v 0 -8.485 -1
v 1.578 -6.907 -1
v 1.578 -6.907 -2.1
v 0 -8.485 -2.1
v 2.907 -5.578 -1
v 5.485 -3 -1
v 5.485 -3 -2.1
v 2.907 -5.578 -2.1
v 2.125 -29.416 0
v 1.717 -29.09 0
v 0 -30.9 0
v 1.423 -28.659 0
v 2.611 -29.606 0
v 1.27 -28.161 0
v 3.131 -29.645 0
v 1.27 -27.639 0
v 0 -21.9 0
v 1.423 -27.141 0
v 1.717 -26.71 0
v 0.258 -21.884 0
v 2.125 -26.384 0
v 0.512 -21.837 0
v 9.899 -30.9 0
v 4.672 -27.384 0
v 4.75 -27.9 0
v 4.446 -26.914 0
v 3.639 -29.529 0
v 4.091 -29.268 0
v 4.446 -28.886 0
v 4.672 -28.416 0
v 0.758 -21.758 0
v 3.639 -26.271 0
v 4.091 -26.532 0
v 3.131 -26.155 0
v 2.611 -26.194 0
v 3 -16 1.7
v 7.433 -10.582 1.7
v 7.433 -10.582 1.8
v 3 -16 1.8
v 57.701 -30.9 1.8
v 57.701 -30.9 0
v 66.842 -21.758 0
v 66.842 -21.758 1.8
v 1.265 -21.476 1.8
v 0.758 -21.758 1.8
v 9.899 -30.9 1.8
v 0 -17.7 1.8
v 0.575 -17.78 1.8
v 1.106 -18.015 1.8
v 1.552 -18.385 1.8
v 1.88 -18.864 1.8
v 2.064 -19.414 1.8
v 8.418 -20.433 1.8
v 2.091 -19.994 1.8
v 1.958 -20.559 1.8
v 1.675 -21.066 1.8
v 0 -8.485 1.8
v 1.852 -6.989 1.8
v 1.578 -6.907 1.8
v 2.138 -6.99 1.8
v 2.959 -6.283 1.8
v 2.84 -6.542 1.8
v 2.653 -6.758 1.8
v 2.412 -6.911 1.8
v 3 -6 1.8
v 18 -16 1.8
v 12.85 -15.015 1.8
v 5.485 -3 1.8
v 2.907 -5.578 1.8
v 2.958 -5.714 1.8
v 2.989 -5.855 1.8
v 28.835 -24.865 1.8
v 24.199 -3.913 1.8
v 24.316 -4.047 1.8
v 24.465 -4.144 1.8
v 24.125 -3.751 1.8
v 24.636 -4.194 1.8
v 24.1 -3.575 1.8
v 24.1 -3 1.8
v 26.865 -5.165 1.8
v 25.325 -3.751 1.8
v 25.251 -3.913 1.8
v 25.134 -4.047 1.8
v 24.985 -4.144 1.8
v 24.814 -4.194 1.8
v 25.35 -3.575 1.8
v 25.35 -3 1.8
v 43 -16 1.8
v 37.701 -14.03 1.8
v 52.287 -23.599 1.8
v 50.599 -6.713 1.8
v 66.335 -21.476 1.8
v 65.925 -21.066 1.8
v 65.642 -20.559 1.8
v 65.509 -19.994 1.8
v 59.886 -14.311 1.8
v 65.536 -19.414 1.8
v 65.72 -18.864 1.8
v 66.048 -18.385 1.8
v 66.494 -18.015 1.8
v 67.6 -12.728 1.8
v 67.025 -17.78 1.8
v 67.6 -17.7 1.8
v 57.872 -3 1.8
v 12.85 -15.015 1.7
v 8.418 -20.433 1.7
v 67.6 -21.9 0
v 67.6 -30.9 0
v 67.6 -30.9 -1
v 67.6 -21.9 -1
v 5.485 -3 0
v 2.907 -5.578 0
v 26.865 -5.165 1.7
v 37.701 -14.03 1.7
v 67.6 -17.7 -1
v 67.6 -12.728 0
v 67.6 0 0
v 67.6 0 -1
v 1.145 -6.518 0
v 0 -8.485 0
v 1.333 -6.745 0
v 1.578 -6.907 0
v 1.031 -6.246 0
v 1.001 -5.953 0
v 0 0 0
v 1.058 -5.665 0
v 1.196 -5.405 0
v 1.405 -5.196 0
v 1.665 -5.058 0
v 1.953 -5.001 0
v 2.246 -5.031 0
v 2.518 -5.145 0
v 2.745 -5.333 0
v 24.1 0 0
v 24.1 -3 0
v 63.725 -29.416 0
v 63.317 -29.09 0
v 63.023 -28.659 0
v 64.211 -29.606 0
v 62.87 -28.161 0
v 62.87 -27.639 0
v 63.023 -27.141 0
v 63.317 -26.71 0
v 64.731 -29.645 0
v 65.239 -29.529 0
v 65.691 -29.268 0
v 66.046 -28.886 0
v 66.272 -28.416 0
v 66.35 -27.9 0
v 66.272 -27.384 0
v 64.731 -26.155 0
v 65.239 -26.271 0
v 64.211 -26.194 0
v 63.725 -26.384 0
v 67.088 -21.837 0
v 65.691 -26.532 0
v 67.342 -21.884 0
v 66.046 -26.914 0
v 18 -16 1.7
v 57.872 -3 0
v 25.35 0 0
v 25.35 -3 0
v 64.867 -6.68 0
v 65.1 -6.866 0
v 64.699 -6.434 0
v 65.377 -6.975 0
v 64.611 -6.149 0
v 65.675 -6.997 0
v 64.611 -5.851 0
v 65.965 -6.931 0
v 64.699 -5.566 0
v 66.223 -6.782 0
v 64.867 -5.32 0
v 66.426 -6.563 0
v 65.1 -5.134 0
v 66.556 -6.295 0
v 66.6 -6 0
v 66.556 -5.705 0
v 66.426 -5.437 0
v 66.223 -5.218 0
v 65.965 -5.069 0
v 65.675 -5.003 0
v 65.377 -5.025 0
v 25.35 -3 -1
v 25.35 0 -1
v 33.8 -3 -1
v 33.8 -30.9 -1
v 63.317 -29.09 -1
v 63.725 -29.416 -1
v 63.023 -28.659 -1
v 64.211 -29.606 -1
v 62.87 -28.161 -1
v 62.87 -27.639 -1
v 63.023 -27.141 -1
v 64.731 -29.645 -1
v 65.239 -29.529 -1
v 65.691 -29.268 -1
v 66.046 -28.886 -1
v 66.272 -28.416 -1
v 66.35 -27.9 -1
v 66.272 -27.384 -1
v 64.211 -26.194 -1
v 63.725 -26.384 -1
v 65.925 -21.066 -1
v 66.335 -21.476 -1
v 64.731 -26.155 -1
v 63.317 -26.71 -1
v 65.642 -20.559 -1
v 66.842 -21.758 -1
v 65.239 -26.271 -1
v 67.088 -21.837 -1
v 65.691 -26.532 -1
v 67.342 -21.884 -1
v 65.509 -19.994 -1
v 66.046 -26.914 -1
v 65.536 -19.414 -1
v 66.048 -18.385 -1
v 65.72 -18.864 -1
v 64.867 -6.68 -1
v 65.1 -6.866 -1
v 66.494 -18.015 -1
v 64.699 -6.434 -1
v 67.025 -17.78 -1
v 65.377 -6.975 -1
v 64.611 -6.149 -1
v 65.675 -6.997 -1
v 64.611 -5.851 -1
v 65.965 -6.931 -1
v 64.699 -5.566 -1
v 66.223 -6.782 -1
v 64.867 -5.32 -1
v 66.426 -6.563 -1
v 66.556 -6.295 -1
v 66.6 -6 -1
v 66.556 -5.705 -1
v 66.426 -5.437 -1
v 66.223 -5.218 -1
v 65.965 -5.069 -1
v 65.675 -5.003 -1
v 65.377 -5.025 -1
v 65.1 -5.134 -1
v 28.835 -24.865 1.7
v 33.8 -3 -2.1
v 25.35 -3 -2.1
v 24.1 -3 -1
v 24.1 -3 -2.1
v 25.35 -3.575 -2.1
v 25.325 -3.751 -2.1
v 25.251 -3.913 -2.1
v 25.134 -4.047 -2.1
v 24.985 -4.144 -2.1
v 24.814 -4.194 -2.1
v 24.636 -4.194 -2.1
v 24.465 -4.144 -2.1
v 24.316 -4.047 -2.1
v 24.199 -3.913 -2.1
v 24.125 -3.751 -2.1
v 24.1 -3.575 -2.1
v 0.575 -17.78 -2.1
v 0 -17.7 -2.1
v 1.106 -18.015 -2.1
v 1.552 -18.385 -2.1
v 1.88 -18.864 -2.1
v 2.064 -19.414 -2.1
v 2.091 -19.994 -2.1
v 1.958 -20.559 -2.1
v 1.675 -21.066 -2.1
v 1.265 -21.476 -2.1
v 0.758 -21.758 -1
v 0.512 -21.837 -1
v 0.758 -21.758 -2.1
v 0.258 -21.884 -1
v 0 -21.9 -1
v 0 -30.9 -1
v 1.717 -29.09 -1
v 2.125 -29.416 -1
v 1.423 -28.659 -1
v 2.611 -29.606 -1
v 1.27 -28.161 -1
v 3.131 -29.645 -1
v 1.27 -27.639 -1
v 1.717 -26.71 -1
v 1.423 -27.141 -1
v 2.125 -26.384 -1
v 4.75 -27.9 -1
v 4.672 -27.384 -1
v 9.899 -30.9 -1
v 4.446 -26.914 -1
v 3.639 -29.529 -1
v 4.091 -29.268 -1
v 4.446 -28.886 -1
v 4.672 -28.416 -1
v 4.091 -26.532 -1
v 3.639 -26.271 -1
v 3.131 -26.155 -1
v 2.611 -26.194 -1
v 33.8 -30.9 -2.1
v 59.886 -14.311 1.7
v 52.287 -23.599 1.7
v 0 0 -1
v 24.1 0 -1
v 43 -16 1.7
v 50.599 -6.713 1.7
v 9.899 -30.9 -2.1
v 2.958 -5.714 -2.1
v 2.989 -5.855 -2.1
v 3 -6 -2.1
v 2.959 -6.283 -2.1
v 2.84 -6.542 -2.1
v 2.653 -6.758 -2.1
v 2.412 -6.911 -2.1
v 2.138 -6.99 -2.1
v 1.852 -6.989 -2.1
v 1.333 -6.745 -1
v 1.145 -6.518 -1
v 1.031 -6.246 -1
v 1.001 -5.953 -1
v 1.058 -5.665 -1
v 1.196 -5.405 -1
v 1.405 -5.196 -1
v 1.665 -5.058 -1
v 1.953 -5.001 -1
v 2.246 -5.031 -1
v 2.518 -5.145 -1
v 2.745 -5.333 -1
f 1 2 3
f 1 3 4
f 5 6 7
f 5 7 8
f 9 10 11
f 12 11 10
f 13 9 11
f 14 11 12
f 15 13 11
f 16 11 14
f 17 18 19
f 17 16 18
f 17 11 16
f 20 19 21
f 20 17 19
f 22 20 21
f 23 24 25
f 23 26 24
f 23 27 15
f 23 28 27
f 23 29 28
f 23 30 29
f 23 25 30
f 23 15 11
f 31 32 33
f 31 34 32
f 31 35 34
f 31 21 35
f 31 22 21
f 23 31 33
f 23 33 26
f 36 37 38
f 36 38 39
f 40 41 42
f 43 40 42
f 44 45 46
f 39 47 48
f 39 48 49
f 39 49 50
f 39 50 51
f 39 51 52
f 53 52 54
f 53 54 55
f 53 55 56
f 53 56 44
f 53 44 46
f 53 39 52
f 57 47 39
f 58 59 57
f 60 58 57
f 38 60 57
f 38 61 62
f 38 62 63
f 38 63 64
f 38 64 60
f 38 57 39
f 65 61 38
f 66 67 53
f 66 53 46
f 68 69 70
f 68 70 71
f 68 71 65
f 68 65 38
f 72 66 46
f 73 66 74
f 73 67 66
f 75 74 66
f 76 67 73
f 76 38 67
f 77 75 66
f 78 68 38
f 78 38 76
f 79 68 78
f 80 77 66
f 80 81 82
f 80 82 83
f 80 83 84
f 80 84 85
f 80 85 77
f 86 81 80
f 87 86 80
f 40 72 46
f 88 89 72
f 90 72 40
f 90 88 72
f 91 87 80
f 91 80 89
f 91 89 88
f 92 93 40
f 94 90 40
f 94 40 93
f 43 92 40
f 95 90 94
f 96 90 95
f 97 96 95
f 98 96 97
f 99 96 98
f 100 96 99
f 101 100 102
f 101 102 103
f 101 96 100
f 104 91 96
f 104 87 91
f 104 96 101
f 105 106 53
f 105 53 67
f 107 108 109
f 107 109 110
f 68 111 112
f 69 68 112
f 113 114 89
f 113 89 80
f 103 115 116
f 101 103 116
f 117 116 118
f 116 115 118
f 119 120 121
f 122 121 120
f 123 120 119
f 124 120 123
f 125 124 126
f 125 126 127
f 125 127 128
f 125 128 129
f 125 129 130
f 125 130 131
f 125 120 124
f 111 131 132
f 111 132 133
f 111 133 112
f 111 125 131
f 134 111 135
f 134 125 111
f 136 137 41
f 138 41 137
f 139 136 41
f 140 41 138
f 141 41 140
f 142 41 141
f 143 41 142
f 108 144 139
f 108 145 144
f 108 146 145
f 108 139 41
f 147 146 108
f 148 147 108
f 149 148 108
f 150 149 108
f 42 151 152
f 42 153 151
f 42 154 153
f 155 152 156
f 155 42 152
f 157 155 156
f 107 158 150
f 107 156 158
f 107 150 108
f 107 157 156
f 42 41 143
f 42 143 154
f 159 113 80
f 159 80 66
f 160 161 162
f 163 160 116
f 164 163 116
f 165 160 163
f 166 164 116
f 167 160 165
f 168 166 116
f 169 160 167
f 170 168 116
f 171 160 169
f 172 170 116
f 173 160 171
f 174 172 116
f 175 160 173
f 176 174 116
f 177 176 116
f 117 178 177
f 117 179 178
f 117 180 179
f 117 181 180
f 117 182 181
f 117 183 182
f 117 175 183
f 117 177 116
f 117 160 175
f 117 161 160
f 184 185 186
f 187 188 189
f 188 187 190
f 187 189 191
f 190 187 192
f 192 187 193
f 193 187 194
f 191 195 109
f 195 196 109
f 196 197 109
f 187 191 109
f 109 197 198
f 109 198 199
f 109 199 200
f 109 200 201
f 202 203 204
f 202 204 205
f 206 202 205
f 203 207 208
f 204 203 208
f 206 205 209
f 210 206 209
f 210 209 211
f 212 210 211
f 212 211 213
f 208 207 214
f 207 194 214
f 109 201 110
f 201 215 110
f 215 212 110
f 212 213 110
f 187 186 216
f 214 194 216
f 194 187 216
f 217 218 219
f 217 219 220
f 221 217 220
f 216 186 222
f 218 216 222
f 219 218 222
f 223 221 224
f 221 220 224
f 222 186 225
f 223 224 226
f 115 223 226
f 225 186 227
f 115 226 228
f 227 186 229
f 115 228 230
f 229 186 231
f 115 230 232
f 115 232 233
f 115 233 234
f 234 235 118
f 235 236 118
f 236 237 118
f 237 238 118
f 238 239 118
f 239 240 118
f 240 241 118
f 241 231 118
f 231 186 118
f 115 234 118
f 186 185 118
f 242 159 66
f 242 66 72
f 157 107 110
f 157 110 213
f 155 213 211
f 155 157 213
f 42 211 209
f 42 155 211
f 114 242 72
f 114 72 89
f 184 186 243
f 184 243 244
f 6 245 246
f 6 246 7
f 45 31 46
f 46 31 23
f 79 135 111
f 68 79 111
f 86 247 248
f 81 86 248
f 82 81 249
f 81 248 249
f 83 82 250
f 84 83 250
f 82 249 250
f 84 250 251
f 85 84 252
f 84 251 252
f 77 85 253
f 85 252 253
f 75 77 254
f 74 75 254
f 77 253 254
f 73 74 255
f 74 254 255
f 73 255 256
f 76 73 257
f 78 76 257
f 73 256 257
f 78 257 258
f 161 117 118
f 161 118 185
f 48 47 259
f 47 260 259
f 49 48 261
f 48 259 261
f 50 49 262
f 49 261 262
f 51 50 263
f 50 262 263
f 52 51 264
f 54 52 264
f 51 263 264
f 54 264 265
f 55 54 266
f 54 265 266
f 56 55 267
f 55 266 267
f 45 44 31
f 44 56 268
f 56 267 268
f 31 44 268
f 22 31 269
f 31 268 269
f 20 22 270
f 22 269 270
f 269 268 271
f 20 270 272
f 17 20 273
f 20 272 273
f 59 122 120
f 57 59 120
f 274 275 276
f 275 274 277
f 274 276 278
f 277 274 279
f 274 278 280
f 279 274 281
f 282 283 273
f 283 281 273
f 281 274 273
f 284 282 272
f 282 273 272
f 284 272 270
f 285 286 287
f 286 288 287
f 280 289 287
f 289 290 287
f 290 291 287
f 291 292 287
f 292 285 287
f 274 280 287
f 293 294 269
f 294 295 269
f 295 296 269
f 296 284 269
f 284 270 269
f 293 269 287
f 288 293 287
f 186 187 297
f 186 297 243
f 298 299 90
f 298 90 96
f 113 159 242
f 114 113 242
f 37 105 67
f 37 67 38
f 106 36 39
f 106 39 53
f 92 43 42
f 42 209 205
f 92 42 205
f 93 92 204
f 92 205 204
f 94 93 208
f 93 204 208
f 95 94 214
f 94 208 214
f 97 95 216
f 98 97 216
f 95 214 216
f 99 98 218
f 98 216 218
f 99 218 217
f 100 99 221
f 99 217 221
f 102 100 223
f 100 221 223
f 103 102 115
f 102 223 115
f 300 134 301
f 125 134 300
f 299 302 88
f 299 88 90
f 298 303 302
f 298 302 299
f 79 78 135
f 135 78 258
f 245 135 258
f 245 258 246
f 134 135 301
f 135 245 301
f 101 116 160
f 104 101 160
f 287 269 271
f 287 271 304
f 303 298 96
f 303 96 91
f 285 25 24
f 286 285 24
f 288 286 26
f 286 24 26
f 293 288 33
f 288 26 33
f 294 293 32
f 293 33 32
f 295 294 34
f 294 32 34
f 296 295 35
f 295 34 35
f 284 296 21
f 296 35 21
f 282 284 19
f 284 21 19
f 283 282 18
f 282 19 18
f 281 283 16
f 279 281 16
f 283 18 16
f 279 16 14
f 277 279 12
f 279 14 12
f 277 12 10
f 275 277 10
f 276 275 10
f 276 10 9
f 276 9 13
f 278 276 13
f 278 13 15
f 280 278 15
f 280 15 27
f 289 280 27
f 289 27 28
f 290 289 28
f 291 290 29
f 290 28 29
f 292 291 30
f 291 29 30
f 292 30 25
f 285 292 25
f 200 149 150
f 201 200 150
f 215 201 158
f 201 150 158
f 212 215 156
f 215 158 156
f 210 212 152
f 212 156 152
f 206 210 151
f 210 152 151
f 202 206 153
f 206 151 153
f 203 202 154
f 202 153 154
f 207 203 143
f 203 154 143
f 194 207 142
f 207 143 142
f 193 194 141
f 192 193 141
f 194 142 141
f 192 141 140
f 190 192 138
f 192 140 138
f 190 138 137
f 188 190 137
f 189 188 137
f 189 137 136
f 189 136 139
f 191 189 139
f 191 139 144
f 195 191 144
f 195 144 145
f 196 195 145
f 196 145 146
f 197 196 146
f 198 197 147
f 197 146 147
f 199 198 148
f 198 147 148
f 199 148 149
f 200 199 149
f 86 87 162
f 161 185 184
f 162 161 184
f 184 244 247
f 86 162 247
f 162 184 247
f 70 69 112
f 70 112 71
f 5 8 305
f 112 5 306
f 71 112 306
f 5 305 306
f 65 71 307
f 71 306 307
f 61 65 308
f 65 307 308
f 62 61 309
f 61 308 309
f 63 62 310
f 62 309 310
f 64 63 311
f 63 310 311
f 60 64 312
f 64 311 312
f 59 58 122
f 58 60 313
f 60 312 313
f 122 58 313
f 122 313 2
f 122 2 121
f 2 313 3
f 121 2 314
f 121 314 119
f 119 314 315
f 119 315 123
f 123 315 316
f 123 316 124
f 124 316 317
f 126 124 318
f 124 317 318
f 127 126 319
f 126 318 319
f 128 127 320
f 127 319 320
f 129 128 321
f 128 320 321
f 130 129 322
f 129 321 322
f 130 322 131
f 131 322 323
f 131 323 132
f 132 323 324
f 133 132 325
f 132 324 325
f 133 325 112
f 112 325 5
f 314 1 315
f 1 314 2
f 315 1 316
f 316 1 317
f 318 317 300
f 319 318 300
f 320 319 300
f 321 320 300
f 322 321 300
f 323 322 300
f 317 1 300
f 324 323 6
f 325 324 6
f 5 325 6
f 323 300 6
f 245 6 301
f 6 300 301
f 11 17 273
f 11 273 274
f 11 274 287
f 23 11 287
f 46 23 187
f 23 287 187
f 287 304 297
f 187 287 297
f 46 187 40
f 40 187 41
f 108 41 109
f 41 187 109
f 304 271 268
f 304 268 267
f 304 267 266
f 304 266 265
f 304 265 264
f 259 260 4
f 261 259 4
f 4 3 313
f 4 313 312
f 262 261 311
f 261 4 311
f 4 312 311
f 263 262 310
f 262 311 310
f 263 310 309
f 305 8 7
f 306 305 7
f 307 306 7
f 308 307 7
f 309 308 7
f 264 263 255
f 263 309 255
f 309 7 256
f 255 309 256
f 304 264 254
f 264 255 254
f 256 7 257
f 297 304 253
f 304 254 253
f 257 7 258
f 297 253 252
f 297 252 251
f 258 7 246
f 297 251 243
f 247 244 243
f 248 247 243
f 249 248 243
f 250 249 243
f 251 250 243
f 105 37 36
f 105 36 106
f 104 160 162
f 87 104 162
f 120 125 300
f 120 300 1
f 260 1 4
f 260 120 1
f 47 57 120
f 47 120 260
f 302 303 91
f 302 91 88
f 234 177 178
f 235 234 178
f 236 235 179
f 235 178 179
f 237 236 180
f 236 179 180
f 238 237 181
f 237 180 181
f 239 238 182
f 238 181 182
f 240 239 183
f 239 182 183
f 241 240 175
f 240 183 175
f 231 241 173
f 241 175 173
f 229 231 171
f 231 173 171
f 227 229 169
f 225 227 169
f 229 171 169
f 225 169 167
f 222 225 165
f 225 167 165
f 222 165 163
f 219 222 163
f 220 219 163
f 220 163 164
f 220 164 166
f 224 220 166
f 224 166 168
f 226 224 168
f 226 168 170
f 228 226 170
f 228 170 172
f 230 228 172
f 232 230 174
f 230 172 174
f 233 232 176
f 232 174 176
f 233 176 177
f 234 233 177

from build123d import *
from build123d import SkipClean  # not in build123d's __all__

# Parameters (mm, degrees)
F0_W     = 8.45
F0_H     = 3
F0_R     = 1.75
F0_R_2   = 1
F1_DEPTH = 1
F2_DEPTH = 2.1
F3_DEPTH = 1.8
F5_START = 1.7
F5_DEPTH = 0.3


with BuildPart() as f1:
    # F0 (on Top) → F1 (new body)
    with BuildSketch(Plane.XY):
        with Locations((29.575, -1.5)):
            Rectangle(F0_W, F0_H)
        Polygon((33.8, 0), (33.8, -3), (57.8720779386, -3), (54.8720779386, 0), align=None)
        Polygon((54.8720779386, 0), (57.8720779386, -3), (67.6, -3), (67.6, 0), align=None)
        with BuildLine():
            Line((66.8420563389, -21.7584487245), (57.7005050634, -30.9))
            Line((57.7005050634, -30.9), (67.6, -30.9))
            Line((67.6, -30.9), (67.6, -21.9))
            ThreePointArc((67.6, -21.9), (67.2144758902, -21.8643088821), (66.8420563389, -21.7584487245))
        make_face()
        with Locations((64.6, -27.9)):
            Circle(F0_R, mode=Mode.SUBTRACT)
        with BuildLine():
            Line((33.8, -3), (33.8, -30.9))
            Line((33.8, -30.9), (57.7005050634, -30.9))
            Line((57.7005050634, -30.9), (66.8420563389, -21.7584487245))
            ThreePointArc((66.8420563389, -21.7584487245), (65.5356911179, -19.4144758902), (67.6, -17.7))
            Line((67.6, -17.7), (67.6, -12.7279220614))
            Line((67.6, -12.7279220614), (57.8720779386, -3))
            Line((57.8720779386, -3), (33.8, -3))
        make_face()
        with BuildLine():
            Line((24.1, -3), (5.4852813742, -3))
            Line((5.4852813742, -3), (2.9068134786, -5.5784678956))
            ThreePointArc((2.9068134786, -5.5784678956), (2.9764254909, -5.7841452787), (3, -6))
            ThreePointArc((3, -6), (2.5378047488, -6.8430694231), (1.5784678956, -6.9068134786))
            Line((1.5784678956, -6.9068134786), (0, -8.4852813742))
            Line((0, -8.4852813742), (0, -17.7))
            ThreePointArc((0, -17.7), (2.0643088821, -19.4144758902), (0.7579436611, -21.7584487245))
            Line((0.7579436611, -21.7584487245), (9.8994949366, -30.9))
            Line((9.8994949366, -30.9), (33.8, -30.9))
            Line((33.8, -30.9), (33.8, -3))
            Line((33.8, -3), (25.35, -3))
            Line((25.35, -3), (25.35, -3.575))
            ThreePointArc((25.35, -3.575), (24.725, -4.2), (24.1, -3.575))
            Line((24.1, -3.575), (24.1, -3))
        make_face()
        with BuildLine():
            Line((9.8994949366, -30.9), (0.7579436611, -21.7584487245))
            ThreePointArc((0.7579436611, -21.7584487245), (0.3855241098, -21.8643088821), (0, -21.9))
            Line((0, -21.9), (0, -30.9))
            Line((0, -30.9), (9.8994949366, -30.9))
        make_face()
        with Locations((3, -27.9)):
            Circle(F0_R, mode=Mode.SUBTRACT)
        Polygon((8.4852813742, 0), (0, 0), (0, -3), (5.4852813742, -3), align=None)
        Polygon((24.1, 0), (8.4852813742, 0), (5.4852813742, -3), (24.1, -3), align=None)
        with BuildLine():
            Line((5.4852813742, -3), (0, -3))
            Line((0, -3), (0, -8.4852813742))
            Line((0, -8.4852813742), (1.5784678956, -6.9068134786))
            ThreePointArc((1.5784678956, -6.9068134786), (1.2928932188, -5.2928932188), (2.9068134786, -5.5784678956))
            Line((2.9068134786, -5.5784678956), (5.4852813742, -3))
        make_face()
        Polygon((67.6, -3), (57.8720779386, -3), (67.6, -12.7279220614), align=None)
        with Locations((65.6, -6)):
            Circle(F0_R_2, mode=Mode.SUBTRACT)
    extrude(amount=-F1_DEPTH)

    # F0 (on Top) → F2 (join)
    with BuildSketch(Plane.XY):
        with BuildLine():
            Line((24.1, -3), (5.4852813742, -3))
            Line((5.4852813742, -3), (2.9068134786, -5.5784678956))
            ThreePointArc((2.9068134786, -5.5784678956), (2.9764254909, -5.7841452787), (3, -6))
            ThreePointArc((3, -6), (2.5378047488, -6.8430694231), (1.5784678956, -6.9068134786))
            Line((1.5784678956, -6.9068134786), (0, -8.4852813742))
            Line((0, -8.4852813742), (0, -17.7))
            ThreePointArc((0, -17.7), (2.0643088821, -19.4144758902), (0.7579436611, -21.7584487245))
            Line((0.7579436611, -21.7584487245), (9.8994949366, -30.9))
            Line((9.8994949366, -30.9), (33.8, -30.9))
            Line((33.8, -30.9), (33.8, -3))
            Line((33.8, -3), (25.35, -3))
            Line((25.35, -3), (25.35, -3.575))
            ThreePointArc((25.35, -3.575), (24.725, -4.2), (24.1, -3.575))
            Line((24.1, -3.575), (24.1, -3))
        make_face()
    with SkipClean():  # cleaning this boolean's faces spoils the solid; the shape is the same uncleaned
        extrude(amount=-F2_DEPTH)

    # F0 (on Top) → F3 (join)
    with BuildSketch(Plane.XY):
        with BuildLine():
            Line((24.1, -3), (5.4852813742, -3))
            Line((5.4852813742, -3), (2.9068134786, -5.5784678956))
            ThreePointArc((2.9068134786, -5.5784678956), (2.9764254909, -5.7841452787), (3, -6))
            ThreePointArc((3, -6), (2.5378047488, -6.8430694231), (1.5784678956, -6.9068134786))
            Line((1.5784678956, -6.9068134786), (0, -8.4852813742))
            Line((0, -8.4852813742), (0, -17.7))
            ThreePointArc((0, -17.7), (2.0643088821, -19.4144758902), (0.7579436611, -21.7584487245))
            Line((0.7579436611, -21.7584487245), (9.8994949366, -30.9))
            Line((9.8994949366, -30.9), (33.8, -30.9))
            Line((33.8, -30.9), (33.8, -3))
            Line((33.8, -3), (25.35, -3))
            Line((25.35, -3), (25.35, -3.575))
            ThreePointArc((25.35, -3.575), (24.725, -4.2), (24.1, -3.575))
            Line((24.1, -3.575), (24.1, -3))
        make_face()
        with BuildLine():
            Line((33.8, -3), (33.8, -30.9))
            Line((33.8, -30.9), (57.7005050634, -30.9))
            Line((57.7005050634, -30.9), (66.8420563389, -21.7584487245))
            ThreePointArc((66.8420563389, -21.7584487245), (65.5356911179, -19.4144758902), (67.6, -17.7))
            Line((67.6, -17.7), (67.6, -12.7279220614))
            Line((67.6, -12.7279220614), (57.8720779386, -3))
            Line((57.8720779386, -3), (33.8, -3))
        make_face()
    extrude(amount=F3_DEPTH)

    # F4 (on Top) → F5 (cut)
    with BuildSketch(Plane.XY.offset(F5_START)):
        Polygon((8.4177003427, -20.4326654506), (12.8503657933, -15.014965108), (7.4326654506, -10.5822996573), (3, -16), align=None)
        Polygon((37.7007315866, -14.0299302159), (26.8653309013, -5.1645993147), (18, -16), (28.8354006853, -24.8653309013), align=None)
        Polygon((52.2874863017, -23.5988550582), (59.8863413599, -14.3113687565), (50.5988550582, -6.7125136983), (43, -16), align=None)
    extrude(amount=F5_DEPTH, mode=Mode.SUBTRACT)


solid = f1.part
